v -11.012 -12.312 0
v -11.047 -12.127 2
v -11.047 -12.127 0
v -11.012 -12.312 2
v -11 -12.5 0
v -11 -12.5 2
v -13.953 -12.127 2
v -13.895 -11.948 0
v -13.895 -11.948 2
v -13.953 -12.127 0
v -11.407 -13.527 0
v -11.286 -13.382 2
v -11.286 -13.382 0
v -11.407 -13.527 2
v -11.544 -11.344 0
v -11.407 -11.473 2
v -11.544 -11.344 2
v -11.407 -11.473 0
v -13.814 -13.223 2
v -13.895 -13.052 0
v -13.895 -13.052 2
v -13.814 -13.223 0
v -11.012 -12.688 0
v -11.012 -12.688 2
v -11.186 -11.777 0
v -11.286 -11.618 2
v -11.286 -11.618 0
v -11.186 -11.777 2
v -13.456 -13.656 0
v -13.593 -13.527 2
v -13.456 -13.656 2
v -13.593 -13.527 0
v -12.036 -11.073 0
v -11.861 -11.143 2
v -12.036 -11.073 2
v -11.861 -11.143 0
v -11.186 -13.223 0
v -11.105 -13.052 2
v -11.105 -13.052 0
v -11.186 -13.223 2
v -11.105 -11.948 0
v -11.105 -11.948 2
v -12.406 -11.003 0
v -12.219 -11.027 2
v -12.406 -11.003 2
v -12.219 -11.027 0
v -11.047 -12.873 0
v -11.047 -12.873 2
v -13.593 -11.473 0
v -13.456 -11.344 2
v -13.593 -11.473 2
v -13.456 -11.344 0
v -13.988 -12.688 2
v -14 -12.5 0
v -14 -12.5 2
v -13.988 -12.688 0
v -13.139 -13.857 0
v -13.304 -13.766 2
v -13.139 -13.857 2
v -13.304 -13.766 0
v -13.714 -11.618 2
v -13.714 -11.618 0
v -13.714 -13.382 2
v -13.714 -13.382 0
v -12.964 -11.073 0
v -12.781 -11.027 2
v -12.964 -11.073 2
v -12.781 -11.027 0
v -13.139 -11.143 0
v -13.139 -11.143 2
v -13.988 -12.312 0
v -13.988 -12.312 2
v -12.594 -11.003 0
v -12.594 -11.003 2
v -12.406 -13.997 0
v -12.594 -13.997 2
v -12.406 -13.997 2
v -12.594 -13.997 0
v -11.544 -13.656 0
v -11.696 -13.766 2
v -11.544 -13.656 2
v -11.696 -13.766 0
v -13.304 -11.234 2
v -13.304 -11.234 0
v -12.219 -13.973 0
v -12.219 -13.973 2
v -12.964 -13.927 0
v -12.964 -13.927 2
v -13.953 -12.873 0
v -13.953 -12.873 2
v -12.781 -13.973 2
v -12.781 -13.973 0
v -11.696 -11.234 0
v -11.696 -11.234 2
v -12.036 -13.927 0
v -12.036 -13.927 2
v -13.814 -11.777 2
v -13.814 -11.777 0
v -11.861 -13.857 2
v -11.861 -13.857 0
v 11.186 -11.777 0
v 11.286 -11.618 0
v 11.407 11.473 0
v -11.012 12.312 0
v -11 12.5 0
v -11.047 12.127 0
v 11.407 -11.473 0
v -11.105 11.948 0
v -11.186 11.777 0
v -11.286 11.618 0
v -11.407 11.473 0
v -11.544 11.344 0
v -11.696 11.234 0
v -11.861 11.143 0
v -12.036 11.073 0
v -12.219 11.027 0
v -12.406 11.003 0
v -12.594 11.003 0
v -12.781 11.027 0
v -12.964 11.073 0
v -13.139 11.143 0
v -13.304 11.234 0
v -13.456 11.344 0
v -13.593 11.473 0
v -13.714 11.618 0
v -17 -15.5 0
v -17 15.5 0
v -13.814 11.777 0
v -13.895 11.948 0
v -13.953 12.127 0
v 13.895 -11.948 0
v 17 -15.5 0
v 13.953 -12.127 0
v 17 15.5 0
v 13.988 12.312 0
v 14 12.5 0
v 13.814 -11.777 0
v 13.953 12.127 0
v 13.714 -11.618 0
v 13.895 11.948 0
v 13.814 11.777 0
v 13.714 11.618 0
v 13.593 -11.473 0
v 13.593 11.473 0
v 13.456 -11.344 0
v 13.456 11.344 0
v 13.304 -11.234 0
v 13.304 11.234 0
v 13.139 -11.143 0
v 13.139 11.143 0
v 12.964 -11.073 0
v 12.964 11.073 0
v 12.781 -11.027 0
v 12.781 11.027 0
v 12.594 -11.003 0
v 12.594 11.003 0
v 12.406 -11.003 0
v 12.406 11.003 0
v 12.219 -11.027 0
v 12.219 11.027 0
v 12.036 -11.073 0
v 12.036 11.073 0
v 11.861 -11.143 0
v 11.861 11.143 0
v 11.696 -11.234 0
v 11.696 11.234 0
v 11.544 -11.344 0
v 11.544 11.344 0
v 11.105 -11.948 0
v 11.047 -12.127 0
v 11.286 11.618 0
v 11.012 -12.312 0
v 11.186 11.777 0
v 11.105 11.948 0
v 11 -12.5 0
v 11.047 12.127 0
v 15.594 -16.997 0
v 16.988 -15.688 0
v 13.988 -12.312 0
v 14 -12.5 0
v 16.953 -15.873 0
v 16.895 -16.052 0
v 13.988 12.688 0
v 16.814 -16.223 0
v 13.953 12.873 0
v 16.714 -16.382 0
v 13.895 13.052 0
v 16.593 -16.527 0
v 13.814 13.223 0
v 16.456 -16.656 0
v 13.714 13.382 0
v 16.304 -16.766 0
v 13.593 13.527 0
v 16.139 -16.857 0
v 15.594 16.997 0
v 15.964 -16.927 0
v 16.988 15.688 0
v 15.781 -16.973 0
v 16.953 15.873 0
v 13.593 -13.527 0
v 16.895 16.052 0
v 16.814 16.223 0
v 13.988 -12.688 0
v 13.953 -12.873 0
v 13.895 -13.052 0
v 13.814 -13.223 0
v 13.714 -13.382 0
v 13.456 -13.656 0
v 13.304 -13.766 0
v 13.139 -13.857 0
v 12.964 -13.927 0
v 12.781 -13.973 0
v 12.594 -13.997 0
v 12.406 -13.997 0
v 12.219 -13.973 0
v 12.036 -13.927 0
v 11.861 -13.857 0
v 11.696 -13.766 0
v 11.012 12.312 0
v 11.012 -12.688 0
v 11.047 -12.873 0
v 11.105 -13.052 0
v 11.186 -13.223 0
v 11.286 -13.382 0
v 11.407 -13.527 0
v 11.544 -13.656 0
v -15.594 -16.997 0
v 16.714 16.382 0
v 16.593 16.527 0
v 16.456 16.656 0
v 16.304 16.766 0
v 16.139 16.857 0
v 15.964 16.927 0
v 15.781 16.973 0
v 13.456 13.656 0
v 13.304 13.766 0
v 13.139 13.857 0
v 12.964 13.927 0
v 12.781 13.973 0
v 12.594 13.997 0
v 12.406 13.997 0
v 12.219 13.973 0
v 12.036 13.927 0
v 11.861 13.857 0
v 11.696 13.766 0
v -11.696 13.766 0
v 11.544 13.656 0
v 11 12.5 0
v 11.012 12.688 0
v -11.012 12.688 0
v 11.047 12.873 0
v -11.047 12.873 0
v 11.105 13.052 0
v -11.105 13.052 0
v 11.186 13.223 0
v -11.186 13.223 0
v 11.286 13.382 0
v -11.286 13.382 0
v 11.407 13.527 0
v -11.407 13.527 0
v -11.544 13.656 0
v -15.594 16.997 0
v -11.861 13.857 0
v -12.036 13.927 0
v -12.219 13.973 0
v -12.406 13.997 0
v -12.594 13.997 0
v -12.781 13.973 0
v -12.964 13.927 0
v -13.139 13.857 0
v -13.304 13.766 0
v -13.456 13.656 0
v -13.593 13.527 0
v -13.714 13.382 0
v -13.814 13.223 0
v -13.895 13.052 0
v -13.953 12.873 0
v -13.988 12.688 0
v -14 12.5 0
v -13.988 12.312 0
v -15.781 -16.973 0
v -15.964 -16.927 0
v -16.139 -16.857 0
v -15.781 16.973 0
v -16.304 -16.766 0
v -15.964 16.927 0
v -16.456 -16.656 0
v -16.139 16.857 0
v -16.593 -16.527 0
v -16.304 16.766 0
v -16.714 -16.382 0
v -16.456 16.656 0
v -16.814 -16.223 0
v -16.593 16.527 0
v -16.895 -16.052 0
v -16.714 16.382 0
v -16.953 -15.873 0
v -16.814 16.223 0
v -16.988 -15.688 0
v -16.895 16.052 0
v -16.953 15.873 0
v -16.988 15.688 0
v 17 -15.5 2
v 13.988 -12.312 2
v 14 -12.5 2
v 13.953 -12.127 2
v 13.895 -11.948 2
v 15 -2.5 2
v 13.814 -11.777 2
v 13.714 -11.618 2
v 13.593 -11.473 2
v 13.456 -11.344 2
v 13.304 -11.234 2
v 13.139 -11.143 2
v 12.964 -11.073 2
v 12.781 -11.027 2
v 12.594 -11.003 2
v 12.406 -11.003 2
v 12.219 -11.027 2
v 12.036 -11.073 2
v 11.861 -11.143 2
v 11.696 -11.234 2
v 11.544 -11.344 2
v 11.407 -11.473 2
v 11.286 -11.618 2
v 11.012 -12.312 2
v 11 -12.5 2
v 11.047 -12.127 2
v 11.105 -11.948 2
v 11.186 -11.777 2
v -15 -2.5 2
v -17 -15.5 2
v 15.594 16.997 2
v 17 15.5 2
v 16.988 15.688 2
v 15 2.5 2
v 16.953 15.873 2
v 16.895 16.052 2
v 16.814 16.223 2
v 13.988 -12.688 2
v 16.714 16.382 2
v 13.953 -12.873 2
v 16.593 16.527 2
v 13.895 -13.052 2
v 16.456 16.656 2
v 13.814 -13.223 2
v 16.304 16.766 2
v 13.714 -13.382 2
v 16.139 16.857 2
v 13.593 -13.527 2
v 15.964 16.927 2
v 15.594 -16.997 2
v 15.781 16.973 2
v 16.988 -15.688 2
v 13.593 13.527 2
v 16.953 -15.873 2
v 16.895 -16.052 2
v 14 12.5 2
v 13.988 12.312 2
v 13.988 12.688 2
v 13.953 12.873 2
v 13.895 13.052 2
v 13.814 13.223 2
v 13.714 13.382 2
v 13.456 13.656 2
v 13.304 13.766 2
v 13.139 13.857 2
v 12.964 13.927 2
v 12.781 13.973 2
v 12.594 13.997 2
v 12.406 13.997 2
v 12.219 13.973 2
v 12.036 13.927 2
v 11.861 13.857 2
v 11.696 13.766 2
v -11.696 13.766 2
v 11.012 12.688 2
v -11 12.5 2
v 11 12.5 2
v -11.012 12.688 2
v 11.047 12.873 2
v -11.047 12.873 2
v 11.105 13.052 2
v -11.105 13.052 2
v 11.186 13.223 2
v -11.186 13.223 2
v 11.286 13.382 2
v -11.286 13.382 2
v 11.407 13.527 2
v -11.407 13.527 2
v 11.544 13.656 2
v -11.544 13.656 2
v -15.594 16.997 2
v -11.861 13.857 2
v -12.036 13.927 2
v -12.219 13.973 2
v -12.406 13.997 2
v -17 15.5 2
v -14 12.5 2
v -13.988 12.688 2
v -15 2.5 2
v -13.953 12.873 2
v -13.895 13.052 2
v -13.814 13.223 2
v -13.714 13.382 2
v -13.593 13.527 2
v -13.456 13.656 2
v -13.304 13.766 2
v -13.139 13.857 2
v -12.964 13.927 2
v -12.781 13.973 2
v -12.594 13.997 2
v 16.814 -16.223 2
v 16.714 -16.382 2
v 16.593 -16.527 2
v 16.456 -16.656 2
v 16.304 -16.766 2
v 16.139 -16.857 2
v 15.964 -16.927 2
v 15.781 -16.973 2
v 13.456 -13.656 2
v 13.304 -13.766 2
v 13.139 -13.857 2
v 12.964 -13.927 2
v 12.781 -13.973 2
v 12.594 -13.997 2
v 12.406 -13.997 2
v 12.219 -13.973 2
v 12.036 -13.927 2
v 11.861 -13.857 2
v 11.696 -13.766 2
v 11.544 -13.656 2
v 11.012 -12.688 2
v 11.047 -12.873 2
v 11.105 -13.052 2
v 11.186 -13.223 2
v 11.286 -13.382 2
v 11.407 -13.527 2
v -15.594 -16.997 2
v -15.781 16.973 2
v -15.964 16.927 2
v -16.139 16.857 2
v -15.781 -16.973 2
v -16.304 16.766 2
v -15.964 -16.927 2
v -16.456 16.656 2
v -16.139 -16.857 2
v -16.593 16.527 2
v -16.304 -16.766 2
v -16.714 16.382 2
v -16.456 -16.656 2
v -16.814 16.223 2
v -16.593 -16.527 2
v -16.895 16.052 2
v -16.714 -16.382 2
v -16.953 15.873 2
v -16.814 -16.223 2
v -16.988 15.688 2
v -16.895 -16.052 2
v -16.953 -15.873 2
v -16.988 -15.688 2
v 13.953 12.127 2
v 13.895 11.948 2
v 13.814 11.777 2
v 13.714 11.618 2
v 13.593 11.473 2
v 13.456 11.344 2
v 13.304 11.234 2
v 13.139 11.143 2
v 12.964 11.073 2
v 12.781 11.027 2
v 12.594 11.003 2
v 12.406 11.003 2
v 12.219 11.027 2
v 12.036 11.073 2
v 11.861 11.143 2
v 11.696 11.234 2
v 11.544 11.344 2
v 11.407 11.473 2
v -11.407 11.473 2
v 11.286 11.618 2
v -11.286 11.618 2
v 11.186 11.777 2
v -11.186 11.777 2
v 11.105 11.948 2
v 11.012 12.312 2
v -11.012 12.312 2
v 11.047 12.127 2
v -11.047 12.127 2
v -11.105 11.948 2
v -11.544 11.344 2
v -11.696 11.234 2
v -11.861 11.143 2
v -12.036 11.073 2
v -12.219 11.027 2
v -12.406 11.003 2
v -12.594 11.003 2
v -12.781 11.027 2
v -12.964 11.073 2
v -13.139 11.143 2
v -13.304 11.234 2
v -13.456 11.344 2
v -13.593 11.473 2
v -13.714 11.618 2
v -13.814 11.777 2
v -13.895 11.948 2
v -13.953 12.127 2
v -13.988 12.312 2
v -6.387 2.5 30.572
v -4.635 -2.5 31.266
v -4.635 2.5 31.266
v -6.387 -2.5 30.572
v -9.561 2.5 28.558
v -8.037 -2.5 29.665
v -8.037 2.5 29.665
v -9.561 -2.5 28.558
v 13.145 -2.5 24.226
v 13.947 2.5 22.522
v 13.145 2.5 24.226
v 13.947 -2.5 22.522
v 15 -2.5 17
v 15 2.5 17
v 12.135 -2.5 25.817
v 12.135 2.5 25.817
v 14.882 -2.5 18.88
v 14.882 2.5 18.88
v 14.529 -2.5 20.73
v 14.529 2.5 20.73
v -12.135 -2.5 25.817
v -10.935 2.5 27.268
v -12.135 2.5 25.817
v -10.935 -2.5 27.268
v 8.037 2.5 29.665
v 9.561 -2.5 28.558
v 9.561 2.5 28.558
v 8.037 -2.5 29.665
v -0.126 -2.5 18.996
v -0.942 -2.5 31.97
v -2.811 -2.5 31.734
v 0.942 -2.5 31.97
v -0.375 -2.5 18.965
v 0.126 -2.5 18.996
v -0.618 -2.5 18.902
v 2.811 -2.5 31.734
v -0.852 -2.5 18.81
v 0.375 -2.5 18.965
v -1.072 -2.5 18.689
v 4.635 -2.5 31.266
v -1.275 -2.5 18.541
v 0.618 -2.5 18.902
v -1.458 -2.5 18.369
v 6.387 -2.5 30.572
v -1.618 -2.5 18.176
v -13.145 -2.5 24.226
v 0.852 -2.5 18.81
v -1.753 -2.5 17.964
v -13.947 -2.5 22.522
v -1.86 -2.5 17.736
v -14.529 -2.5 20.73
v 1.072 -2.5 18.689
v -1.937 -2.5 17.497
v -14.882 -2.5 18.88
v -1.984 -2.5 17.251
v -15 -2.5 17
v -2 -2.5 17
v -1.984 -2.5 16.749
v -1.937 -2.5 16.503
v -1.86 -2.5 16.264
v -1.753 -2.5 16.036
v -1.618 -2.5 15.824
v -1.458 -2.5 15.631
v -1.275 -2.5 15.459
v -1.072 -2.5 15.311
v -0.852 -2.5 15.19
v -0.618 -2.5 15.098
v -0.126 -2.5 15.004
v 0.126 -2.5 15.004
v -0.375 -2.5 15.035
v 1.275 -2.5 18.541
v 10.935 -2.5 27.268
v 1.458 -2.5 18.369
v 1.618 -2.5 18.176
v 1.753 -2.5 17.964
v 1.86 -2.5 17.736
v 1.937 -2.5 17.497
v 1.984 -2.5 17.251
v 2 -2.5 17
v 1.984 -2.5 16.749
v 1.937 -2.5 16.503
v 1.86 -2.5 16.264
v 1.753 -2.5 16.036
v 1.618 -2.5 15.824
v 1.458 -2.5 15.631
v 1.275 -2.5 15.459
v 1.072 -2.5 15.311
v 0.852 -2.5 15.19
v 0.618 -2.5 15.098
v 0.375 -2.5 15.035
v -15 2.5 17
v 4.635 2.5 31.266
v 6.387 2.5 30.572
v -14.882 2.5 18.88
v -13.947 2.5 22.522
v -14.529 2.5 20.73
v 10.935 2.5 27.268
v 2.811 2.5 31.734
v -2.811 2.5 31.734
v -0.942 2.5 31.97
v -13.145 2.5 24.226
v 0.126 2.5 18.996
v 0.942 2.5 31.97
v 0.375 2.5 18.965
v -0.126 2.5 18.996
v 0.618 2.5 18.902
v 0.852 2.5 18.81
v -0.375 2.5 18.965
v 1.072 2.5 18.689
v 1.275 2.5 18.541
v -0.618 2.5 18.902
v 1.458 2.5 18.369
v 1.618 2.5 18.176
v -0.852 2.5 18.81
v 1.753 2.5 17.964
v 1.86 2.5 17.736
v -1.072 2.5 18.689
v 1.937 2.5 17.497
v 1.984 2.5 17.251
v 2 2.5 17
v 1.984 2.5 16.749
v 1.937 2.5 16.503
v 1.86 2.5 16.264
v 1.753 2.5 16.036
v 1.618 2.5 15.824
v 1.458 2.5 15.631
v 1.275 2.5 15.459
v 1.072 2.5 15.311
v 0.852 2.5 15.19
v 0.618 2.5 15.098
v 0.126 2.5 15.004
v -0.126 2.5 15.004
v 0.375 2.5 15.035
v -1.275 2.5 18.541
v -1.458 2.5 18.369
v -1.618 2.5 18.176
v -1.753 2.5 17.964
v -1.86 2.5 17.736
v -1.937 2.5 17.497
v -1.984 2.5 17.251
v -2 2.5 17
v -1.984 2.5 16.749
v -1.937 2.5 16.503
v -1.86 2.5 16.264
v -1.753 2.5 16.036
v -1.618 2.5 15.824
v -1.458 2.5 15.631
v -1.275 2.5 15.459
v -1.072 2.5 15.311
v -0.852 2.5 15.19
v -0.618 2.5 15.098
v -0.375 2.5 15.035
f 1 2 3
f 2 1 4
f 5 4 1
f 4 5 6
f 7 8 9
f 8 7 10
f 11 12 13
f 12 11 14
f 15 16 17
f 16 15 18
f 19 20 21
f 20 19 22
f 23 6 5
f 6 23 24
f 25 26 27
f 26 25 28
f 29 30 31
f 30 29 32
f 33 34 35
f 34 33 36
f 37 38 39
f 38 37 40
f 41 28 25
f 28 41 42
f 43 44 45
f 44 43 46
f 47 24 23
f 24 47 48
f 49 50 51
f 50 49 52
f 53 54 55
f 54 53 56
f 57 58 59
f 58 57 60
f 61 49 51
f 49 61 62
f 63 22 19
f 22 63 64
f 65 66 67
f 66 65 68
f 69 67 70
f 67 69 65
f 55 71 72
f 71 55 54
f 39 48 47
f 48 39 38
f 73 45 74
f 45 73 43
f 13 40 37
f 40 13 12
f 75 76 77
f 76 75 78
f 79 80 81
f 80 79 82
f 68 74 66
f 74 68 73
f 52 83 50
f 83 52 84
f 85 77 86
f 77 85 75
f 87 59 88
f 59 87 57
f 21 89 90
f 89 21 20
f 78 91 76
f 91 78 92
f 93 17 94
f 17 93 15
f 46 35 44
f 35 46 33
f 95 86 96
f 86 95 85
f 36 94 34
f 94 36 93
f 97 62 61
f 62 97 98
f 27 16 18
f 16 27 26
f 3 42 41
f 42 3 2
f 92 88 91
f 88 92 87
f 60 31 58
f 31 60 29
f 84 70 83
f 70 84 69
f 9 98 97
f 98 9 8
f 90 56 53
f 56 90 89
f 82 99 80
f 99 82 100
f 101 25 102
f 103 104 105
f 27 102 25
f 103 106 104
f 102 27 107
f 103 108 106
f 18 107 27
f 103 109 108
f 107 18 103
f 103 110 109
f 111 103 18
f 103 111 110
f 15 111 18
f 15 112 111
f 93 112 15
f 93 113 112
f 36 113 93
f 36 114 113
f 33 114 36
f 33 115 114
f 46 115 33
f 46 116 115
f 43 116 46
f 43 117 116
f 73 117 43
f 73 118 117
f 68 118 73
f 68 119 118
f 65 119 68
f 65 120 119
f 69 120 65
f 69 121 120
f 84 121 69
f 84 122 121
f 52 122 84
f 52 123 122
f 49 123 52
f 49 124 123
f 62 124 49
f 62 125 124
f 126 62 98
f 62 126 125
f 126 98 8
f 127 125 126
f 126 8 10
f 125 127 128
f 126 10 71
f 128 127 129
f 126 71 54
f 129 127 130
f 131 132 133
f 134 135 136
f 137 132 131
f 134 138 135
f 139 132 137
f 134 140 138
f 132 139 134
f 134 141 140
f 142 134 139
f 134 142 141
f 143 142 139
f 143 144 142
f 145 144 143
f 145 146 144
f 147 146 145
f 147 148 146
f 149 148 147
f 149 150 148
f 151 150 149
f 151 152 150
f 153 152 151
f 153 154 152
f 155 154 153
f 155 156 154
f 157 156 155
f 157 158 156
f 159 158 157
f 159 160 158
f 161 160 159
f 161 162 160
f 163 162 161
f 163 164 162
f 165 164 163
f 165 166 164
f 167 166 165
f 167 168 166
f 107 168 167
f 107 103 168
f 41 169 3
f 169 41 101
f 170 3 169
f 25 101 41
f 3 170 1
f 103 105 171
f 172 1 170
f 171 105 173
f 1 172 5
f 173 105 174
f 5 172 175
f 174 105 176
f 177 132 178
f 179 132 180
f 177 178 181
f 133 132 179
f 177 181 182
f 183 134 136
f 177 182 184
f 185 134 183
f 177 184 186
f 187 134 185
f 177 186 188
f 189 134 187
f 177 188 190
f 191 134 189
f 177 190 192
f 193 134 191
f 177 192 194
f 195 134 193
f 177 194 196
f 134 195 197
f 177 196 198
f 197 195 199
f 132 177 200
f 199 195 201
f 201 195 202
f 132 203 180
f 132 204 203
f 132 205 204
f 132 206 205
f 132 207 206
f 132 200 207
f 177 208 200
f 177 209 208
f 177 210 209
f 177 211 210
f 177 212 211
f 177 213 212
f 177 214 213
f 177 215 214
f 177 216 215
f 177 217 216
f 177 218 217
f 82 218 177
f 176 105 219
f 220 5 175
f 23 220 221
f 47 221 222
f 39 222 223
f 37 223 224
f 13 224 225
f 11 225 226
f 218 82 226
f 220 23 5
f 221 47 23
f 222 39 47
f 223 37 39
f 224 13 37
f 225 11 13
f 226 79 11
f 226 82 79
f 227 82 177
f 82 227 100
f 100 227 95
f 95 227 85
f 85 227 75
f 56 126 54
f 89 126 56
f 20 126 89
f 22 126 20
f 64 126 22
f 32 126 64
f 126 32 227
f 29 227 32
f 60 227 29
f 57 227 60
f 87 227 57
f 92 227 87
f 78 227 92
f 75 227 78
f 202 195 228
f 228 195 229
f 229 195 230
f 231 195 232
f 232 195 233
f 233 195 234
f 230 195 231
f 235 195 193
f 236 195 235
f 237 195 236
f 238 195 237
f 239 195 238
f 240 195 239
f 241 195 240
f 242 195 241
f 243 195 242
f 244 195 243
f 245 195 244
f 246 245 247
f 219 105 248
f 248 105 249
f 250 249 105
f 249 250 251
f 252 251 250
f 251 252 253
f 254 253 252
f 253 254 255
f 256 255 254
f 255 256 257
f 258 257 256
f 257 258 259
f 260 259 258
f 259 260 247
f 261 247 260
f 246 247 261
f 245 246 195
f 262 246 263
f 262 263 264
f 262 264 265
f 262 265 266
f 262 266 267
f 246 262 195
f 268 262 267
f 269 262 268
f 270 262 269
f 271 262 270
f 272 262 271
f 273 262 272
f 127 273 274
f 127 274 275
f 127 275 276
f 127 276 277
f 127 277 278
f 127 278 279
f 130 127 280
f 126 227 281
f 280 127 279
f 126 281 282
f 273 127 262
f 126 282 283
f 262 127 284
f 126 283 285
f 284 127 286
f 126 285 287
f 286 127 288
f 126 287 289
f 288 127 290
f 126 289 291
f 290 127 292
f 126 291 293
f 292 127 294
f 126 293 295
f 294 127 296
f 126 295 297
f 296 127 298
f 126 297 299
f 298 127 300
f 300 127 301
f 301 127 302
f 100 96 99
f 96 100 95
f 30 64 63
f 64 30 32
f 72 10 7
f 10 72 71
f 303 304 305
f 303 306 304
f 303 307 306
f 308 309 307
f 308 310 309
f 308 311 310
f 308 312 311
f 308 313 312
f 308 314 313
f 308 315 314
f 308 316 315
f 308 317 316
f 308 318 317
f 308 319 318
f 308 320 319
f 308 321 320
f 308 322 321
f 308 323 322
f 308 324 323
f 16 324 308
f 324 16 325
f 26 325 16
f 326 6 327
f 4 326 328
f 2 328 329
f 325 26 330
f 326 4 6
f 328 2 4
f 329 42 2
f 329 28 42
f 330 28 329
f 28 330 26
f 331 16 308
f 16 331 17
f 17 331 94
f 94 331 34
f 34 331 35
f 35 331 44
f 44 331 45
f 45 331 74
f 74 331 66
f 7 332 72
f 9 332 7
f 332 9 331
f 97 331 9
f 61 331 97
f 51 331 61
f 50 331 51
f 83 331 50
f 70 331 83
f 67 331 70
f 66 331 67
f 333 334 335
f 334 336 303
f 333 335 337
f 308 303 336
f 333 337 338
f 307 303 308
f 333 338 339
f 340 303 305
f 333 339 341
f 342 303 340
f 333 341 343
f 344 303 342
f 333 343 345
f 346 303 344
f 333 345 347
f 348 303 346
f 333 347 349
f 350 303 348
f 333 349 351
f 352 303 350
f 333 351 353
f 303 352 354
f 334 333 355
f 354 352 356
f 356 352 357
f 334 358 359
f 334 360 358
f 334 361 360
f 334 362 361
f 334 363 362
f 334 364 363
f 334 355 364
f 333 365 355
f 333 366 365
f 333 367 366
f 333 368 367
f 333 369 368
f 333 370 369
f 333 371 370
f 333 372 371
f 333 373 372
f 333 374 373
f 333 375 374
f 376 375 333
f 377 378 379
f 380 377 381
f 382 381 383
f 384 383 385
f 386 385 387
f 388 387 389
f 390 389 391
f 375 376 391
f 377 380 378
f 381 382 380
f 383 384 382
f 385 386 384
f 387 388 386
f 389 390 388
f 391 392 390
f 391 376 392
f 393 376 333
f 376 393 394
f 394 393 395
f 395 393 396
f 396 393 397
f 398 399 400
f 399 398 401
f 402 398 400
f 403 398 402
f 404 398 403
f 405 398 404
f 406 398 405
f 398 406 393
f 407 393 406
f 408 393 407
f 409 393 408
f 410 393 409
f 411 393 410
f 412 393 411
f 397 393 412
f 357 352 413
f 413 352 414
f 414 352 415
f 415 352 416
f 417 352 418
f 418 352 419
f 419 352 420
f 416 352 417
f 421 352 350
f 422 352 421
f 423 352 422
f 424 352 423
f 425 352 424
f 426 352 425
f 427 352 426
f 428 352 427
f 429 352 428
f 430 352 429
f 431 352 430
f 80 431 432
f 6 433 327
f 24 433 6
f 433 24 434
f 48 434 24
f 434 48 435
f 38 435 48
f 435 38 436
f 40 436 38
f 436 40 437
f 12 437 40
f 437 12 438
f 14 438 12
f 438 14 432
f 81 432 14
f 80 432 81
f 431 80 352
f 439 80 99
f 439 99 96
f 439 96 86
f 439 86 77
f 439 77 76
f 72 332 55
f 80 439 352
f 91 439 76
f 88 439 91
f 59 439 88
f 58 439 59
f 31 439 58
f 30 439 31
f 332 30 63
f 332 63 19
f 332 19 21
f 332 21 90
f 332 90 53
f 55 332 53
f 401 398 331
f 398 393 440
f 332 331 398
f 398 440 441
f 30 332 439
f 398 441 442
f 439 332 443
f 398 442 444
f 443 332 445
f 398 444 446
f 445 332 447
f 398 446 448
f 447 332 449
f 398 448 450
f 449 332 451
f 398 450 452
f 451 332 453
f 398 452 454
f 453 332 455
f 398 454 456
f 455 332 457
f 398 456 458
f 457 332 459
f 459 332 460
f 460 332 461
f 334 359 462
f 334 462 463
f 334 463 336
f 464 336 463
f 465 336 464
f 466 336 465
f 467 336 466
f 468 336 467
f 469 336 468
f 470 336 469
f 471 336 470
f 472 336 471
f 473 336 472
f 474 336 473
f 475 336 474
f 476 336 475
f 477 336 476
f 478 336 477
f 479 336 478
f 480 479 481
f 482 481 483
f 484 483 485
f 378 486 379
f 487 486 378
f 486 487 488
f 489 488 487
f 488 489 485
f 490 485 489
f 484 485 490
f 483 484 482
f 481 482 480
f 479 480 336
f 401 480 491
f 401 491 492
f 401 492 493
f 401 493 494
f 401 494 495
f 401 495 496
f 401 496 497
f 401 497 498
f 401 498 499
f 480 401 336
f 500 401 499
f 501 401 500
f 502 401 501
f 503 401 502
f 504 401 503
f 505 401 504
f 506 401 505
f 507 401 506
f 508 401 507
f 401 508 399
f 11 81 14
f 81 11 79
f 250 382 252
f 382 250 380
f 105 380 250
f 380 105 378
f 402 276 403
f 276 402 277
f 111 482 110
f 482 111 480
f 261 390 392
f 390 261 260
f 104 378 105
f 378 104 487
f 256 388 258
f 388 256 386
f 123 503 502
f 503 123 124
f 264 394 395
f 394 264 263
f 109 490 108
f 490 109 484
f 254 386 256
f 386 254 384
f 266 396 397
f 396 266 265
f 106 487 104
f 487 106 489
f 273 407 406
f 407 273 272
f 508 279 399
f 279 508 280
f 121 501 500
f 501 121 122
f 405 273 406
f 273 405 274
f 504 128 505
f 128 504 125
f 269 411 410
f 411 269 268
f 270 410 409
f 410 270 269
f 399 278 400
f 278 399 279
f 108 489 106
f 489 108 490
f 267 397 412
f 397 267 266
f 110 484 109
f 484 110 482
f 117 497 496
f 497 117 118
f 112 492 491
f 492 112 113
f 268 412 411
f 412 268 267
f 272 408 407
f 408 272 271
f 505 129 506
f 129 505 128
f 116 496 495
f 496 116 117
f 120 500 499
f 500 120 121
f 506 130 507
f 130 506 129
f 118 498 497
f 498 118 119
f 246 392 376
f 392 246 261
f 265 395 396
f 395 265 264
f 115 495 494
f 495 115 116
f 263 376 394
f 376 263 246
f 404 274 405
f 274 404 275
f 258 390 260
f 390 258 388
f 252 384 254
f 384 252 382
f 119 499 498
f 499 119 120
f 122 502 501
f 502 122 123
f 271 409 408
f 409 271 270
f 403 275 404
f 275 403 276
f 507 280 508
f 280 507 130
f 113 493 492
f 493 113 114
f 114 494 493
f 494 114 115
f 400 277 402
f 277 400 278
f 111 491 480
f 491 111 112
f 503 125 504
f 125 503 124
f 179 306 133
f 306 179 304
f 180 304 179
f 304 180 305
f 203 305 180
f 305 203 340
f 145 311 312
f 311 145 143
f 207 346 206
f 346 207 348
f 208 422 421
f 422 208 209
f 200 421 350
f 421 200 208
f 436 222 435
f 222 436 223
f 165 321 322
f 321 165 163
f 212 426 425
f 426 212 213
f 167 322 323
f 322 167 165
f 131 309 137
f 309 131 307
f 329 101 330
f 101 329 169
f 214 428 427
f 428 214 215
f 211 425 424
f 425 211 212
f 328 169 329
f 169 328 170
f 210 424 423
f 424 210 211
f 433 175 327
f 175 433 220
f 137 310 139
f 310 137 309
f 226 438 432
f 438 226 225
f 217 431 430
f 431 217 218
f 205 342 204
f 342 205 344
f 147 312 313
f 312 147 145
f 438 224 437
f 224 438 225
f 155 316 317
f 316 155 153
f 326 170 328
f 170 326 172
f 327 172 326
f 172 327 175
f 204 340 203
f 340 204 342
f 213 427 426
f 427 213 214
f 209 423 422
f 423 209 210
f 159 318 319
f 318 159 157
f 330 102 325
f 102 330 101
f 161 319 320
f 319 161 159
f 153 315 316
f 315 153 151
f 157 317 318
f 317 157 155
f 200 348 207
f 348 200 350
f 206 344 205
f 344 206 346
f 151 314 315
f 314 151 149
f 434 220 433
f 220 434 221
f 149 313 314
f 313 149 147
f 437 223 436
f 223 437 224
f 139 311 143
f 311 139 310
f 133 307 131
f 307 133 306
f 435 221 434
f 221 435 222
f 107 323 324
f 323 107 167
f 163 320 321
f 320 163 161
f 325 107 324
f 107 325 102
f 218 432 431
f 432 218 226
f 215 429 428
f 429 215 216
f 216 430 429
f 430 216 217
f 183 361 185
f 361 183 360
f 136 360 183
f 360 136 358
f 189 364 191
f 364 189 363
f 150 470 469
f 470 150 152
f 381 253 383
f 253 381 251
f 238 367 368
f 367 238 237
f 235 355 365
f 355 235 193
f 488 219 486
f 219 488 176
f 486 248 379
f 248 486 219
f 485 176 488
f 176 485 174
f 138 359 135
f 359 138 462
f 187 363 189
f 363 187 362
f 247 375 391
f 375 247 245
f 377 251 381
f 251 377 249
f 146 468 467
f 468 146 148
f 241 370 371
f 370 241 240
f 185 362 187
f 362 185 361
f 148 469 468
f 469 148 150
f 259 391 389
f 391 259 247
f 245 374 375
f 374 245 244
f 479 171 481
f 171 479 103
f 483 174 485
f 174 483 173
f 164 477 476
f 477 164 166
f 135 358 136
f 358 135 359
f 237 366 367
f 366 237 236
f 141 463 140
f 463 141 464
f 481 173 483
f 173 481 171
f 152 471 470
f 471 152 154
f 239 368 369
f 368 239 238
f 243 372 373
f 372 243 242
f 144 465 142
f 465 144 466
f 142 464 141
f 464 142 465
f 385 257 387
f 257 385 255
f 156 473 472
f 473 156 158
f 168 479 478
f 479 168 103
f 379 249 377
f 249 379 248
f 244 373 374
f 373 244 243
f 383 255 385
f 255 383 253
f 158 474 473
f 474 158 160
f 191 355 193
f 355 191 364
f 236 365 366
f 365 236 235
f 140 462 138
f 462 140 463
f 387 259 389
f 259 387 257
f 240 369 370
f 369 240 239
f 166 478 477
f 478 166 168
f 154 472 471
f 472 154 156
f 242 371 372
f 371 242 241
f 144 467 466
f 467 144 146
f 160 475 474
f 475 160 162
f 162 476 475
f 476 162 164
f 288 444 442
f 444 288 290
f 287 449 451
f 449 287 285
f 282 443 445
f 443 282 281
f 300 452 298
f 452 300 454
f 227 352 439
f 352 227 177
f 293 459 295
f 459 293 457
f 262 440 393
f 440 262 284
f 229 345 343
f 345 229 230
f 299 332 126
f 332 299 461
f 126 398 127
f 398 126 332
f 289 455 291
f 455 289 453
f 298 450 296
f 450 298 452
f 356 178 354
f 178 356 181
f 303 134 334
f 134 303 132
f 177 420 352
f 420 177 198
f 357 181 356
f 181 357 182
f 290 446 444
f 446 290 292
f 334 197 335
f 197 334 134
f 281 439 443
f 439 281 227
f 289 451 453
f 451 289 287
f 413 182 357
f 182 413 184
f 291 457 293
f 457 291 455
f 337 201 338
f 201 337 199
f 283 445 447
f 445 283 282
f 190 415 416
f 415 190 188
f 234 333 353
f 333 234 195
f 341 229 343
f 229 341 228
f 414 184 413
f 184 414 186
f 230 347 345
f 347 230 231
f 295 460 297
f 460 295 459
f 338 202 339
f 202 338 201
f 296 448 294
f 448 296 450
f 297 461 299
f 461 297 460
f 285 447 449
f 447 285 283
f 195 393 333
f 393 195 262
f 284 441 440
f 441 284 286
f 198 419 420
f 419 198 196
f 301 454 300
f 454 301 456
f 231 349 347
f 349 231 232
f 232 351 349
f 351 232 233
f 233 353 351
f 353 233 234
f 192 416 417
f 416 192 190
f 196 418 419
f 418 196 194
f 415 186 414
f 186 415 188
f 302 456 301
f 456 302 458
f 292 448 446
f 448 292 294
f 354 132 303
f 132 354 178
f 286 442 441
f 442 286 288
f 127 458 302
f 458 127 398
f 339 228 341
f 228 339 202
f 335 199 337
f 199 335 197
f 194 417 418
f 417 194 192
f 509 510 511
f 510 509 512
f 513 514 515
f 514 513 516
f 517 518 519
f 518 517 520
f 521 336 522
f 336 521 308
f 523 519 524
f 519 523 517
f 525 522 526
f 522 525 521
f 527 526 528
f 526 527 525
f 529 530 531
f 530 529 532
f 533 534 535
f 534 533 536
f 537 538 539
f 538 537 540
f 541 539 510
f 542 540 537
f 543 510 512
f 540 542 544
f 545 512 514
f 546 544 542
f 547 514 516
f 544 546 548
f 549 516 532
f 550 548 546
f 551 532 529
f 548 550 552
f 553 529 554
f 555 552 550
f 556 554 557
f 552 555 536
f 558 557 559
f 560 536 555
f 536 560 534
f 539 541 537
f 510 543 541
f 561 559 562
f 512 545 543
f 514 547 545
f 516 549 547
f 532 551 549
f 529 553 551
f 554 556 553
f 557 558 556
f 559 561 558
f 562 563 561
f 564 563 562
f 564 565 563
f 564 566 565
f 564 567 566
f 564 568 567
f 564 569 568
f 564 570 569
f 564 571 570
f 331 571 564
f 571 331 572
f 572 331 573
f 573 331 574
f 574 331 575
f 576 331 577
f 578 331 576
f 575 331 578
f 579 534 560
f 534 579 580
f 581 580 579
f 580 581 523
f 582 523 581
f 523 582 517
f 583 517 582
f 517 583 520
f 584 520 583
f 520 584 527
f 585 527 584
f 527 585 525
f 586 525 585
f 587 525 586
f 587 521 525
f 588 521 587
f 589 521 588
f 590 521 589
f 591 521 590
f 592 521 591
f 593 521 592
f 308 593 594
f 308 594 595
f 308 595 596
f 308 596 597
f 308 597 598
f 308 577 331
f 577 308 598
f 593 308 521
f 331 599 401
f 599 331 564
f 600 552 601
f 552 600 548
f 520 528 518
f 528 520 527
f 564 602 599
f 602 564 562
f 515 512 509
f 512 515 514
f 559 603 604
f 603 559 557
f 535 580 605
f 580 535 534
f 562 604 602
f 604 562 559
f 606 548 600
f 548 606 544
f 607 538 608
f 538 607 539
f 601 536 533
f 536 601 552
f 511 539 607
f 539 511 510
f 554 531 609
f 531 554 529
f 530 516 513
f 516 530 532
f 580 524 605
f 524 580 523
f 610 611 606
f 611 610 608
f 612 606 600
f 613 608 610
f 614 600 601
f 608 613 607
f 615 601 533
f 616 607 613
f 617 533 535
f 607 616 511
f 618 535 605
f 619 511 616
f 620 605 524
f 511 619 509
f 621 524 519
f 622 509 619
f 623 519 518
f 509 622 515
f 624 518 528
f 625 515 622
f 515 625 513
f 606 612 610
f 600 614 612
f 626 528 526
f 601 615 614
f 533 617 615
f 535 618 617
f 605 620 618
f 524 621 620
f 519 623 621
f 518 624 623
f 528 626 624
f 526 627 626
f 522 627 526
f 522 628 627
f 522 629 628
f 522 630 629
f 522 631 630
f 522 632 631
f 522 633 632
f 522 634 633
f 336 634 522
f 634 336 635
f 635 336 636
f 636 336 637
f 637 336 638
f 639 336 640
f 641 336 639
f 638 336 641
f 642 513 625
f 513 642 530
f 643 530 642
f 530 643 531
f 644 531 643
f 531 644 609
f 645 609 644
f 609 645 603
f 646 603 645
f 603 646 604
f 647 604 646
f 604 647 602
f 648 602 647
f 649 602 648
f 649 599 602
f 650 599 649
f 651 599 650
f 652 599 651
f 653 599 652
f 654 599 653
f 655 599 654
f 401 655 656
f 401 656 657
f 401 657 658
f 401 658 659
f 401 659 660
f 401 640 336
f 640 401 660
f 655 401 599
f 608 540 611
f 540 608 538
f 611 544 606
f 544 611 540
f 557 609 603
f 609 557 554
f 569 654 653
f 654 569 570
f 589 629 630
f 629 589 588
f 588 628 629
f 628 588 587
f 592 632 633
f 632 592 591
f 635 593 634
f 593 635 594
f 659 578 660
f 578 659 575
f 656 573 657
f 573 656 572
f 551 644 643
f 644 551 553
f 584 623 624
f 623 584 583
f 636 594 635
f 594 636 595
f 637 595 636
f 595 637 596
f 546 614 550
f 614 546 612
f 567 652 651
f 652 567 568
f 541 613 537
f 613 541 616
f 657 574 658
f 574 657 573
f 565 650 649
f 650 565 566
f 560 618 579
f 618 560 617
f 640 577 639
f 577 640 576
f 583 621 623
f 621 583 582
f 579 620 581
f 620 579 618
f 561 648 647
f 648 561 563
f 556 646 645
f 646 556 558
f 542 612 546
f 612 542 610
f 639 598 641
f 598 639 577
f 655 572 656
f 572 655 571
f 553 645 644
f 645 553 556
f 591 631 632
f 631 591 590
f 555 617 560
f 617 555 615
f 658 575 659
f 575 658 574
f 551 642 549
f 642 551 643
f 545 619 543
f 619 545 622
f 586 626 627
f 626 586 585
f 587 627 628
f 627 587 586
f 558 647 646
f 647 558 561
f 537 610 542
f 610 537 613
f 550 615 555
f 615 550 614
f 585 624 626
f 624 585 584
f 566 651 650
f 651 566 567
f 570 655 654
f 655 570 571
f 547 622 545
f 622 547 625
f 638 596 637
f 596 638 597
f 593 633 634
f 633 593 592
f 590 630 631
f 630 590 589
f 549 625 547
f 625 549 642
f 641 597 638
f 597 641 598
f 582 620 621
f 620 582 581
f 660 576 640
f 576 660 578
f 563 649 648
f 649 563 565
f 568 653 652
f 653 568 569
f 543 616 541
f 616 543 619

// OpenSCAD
PLATE_THICKNESS = 2;
PLATE_WIDTH = 34;
PLATE_LENGTH = 34;

SWIVEL_WIDTH = 30;
SWIVEL_HEIGHT = 30;
SWIVEL_THICKNESS = 5;
SWIVEL_HOLE = 4;

MOUNT_HOLE_SPACING = 25;
MOUNT_HOLE_DIA = 3;

$fn = 50;

module rounded_rect(width, length, height, corner_dia) {
  hull() {
    for(i = [-1, 1]) {
      for(j = [-1, 1]) {
        translate([i * (width - corner_dia)/2, j * (length - corner_dia)/2, 0])
        cylinder(d = corner_dia, h = height);
      }
    }
  }
}

module plate() {
  difference() {
    rounded_rect(PLATE_WIDTH, PLATE_LENGTH, PLATE_THICKNESS, 3);
    for(i = [-1, 1]) {
      for(j = [-1, 1]) {
        translate([i * MOUNT_HOLE_SPACING/2, j * MOUNT_HOLE_SPACING/2, 0]) {
          cylinder(d = MOUNT_HOLE_DIA, h = PLATE_THICKNESS);
        }
      }
    }
  }
}

module swivel() {
  translate([0, -SWIVEL_THICKNESS/2, SWIVEL_HEIGHT/2])
  rotate([-90, 0, 0])
  difference() {
    hull() {
      cylinder(d = SWIVEL_WIDTH, h = SWIVEL_THICKNESS);
      translate([-SWIVEL_WIDTH/2, 0, 0])
      cube(size = [SWIVEL_WIDTH, SWIVEL_HEIGHT/2, SWIVEL_THICKNESS]);
    }
    cylinder(d = SWIVEL_HOLE, h = SWIVEL_THICKNESS);
  }
}

plate();
translate([0, 0, PLATE_THICKNESS])
swivel();
